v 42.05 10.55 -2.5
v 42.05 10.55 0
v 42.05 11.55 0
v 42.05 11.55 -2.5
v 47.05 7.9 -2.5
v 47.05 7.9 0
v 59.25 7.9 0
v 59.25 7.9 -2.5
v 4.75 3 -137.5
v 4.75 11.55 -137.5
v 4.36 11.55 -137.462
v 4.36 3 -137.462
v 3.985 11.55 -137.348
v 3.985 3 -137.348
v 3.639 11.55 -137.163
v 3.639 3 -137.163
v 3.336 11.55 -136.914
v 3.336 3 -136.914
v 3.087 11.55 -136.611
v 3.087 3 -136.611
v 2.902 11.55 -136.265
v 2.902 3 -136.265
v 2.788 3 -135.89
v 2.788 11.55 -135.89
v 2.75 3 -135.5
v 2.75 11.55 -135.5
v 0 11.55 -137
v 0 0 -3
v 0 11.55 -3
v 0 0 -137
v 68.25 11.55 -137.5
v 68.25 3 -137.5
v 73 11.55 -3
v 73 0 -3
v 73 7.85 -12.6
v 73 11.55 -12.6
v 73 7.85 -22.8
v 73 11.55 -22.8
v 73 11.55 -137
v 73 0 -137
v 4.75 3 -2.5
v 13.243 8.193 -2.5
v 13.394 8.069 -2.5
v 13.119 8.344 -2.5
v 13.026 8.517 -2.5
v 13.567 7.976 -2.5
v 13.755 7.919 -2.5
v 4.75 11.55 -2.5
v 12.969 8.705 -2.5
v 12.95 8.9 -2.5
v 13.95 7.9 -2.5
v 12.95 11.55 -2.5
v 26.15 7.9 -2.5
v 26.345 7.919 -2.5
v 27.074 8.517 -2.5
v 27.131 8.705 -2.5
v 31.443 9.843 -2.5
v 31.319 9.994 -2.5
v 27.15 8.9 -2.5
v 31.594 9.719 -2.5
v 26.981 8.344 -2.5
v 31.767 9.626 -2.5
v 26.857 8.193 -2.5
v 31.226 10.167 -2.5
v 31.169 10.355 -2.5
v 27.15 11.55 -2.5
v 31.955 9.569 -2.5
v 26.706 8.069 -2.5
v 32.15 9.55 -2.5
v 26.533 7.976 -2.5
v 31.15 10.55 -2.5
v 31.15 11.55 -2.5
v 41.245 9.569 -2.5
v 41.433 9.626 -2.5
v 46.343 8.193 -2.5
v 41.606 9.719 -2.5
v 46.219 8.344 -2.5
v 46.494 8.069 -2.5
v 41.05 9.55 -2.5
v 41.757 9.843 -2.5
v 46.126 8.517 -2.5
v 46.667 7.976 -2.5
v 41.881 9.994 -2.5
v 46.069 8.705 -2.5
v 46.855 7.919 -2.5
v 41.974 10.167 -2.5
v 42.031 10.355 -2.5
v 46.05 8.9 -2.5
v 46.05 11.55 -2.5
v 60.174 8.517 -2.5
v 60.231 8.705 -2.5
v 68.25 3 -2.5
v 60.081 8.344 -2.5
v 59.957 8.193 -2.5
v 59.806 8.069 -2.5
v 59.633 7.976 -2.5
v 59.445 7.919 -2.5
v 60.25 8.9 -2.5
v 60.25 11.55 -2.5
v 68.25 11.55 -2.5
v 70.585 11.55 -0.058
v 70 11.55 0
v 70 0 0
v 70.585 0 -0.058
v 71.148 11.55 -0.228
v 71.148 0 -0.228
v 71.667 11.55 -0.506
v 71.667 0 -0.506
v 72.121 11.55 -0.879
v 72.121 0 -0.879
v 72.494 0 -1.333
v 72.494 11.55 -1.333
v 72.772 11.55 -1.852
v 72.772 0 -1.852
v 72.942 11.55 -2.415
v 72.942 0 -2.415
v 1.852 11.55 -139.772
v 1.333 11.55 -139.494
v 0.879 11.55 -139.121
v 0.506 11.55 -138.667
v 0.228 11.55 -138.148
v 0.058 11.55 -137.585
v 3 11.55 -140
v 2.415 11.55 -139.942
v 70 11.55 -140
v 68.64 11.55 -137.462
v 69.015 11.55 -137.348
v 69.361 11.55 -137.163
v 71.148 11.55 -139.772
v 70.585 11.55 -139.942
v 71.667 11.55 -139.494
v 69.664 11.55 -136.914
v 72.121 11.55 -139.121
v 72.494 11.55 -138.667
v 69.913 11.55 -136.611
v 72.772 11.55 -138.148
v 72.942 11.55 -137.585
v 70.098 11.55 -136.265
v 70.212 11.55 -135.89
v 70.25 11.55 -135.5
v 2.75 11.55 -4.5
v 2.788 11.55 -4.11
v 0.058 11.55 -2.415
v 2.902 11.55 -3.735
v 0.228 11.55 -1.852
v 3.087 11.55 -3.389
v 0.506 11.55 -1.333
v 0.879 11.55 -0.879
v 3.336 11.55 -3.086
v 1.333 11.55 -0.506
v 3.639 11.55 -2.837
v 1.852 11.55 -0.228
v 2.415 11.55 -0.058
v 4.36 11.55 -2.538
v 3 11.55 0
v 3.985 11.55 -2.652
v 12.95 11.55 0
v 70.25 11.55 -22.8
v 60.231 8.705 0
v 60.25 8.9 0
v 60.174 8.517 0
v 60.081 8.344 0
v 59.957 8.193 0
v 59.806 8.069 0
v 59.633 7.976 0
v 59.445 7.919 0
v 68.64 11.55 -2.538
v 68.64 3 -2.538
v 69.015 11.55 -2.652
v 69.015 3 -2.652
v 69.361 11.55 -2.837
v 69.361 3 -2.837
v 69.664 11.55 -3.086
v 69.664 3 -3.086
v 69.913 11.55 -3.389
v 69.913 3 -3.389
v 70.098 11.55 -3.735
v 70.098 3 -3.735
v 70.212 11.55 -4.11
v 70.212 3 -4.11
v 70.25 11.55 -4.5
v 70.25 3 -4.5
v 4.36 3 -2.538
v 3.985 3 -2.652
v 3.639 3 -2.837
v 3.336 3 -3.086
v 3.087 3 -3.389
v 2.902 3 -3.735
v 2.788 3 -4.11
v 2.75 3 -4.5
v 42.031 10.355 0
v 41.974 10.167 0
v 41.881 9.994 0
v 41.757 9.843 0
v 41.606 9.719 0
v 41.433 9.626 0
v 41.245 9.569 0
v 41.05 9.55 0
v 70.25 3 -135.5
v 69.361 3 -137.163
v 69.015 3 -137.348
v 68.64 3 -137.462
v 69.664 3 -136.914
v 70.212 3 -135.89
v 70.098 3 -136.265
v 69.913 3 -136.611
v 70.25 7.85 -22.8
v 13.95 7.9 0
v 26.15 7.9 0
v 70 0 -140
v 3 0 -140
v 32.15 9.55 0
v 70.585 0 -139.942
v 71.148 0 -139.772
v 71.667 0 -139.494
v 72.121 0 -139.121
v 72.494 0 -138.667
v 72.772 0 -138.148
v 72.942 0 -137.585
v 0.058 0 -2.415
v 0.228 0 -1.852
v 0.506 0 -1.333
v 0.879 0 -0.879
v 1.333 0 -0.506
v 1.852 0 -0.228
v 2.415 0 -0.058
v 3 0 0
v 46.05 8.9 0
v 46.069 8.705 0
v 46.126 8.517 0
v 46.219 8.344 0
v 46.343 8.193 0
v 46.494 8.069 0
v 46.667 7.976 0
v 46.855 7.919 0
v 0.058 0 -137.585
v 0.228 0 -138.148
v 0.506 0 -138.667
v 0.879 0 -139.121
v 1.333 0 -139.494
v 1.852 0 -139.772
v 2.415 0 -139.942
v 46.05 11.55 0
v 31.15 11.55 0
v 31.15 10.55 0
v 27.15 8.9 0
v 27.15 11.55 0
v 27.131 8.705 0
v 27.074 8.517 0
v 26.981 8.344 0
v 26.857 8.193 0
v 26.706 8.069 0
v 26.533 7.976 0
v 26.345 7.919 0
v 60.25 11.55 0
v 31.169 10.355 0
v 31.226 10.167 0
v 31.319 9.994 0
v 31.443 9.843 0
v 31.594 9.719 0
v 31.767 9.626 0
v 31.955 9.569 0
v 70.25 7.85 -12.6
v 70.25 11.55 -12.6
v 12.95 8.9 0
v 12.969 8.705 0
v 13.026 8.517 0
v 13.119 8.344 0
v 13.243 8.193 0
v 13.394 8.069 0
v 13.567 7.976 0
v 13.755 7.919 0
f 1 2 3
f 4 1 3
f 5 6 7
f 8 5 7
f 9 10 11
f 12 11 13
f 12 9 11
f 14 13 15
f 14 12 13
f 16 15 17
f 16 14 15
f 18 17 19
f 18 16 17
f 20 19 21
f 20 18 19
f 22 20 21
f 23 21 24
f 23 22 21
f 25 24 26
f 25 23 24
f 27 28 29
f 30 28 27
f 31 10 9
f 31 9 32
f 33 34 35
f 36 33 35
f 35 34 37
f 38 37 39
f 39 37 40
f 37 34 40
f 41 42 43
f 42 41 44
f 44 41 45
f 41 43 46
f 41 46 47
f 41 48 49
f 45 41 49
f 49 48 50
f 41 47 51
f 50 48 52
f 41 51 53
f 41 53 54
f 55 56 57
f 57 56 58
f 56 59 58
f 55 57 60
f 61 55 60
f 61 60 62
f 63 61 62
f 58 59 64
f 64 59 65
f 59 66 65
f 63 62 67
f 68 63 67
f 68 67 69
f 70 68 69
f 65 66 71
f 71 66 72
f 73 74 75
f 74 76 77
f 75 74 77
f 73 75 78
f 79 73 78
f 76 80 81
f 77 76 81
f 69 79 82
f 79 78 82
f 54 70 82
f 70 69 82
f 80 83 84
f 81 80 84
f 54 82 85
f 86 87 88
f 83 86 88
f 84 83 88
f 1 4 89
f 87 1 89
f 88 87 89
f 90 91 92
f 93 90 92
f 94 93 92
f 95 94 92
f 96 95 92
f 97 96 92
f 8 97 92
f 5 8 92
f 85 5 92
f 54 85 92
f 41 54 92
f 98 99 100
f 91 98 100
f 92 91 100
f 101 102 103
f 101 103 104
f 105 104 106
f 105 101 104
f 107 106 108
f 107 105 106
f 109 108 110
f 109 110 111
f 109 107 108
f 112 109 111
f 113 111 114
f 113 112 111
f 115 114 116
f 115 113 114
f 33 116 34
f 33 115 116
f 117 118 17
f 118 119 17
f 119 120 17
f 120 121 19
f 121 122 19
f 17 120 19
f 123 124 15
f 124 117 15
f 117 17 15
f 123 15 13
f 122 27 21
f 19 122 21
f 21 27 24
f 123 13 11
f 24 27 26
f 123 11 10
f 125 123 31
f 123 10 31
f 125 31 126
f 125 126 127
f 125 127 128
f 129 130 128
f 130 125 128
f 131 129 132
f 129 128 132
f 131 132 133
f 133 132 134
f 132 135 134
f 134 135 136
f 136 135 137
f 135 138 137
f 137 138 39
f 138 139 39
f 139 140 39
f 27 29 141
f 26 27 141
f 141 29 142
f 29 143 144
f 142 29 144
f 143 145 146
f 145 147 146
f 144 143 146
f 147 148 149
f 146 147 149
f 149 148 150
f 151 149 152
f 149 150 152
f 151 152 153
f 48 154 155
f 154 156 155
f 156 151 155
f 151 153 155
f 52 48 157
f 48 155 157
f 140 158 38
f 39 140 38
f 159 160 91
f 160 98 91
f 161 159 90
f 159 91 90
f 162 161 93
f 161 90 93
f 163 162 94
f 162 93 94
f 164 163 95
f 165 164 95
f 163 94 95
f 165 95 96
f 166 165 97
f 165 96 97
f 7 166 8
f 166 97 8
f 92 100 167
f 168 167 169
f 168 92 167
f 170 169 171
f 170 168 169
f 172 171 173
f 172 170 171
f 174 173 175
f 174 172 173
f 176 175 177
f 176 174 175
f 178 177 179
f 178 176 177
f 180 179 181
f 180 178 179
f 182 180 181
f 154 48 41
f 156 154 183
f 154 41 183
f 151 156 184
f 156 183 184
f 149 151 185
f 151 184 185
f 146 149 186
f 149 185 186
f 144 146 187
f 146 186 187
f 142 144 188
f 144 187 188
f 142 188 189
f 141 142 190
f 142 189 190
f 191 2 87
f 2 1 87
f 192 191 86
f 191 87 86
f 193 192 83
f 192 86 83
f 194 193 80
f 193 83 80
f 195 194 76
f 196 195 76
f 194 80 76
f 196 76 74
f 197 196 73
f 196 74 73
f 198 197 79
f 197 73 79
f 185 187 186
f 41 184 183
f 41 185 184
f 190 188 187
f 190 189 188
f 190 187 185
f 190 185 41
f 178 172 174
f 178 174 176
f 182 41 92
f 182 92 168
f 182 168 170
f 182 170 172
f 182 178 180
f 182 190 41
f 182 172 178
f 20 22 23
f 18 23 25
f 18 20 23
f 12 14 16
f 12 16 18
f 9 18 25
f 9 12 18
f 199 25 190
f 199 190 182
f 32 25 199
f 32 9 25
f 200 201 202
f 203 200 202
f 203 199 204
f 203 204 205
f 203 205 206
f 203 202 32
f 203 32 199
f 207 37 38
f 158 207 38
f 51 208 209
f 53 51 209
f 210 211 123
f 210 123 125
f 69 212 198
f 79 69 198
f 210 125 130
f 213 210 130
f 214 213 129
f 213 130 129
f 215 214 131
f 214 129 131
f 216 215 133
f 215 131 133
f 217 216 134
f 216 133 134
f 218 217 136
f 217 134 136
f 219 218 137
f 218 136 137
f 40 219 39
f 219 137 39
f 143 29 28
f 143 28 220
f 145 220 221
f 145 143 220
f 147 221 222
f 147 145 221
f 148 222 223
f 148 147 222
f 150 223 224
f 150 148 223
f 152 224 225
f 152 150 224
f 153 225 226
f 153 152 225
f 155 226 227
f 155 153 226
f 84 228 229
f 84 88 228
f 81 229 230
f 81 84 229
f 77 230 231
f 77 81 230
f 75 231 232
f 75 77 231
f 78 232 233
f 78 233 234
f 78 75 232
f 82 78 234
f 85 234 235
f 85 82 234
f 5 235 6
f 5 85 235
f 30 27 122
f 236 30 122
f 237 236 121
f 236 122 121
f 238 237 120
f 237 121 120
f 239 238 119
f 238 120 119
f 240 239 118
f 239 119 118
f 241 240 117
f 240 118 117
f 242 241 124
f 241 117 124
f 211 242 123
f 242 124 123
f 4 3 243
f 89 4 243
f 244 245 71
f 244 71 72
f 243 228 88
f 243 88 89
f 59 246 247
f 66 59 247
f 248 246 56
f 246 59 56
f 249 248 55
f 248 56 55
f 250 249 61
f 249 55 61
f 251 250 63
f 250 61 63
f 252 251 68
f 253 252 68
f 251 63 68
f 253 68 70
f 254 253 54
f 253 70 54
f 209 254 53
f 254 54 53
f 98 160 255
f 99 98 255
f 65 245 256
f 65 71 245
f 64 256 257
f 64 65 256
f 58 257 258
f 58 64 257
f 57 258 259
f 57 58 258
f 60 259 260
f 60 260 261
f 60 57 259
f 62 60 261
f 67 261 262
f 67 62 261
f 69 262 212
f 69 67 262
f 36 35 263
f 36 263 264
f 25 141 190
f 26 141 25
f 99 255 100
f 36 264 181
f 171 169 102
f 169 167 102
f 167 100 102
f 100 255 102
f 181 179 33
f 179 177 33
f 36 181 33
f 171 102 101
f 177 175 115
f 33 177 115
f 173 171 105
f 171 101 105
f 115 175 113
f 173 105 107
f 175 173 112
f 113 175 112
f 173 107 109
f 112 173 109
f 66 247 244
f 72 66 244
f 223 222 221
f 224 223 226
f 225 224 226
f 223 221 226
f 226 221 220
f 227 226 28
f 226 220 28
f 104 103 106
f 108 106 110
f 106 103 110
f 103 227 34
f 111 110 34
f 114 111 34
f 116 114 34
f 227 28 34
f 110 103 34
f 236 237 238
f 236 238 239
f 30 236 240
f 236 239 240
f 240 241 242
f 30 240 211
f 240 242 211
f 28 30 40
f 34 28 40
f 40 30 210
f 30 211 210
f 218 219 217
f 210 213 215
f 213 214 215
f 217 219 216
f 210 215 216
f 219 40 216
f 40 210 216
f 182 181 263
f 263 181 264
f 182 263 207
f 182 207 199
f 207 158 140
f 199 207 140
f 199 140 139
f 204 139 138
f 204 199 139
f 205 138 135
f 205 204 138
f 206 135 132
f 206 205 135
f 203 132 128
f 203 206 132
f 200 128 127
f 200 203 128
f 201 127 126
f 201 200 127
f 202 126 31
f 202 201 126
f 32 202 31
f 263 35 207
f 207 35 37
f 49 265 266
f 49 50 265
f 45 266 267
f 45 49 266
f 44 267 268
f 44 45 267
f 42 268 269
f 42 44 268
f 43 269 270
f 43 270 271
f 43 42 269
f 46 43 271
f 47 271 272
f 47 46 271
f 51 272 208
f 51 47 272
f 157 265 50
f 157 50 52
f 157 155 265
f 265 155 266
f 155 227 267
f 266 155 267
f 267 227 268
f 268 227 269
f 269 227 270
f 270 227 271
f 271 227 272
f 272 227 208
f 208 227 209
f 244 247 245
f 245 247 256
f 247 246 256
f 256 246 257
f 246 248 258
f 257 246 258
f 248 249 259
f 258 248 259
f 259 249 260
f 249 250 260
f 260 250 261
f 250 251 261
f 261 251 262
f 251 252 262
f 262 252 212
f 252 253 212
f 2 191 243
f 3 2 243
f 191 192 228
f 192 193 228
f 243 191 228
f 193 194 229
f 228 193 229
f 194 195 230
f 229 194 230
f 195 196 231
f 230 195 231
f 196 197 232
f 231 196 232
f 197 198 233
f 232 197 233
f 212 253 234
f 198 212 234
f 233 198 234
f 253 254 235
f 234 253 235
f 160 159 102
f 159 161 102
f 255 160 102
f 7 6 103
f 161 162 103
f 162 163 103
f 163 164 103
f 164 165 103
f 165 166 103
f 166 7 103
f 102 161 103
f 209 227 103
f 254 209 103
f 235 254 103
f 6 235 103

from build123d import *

# Parameters (mm, degrees)
SKETCH1_W           = 73
SKETCH1_H           = 140
BOSS_EXTRUDE1_DEPTH = 16
SKETCH2_W           = 67.5
SKETCH2_H           = 135
CUT_EXTRUDE1_DEPTH  = 13
SKETCH3_W           = 14.2
SKETCH3_H           = 6.45
SKETCH3_W_2         = 10.9
SKETCH3_H_2         = 4.8
CUT_EXTRUDE2_DEPTH  = 2.5
FILLET1_R           = 3
SKETCH4_W           = 10.2
SKETCH4_H           = 5.5
CUT_EXTRUDE3_DEPTH  = 2.75
FILLET2_R           = 1
FILLET3_R           = 1
FILLET4_R           = 2
CHAMFER1_SIZE       = 1
SKETCH6_W           = 92.196914974
SKETCH6_H           = 18.56524909
CUT_EXTRUDE4_DEPTH  = 159.697826072


with BuildPart() as part:
    # Sketch1 → Boss-Extrude1 (new body)
    with BuildSketch(Plane(origin=(0, 0, 0), x_dir=(1, 0, 0), z_dir=(0, 1, 0))):
        with Locations((36.5, 70)):
            Rectangle(SKETCH1_W, SKETCH1_H)
    extrude(amount=BOSS_EXTRUDE1_DEPTH)

    # Sketch2 → Cut-Extrude1 (cut)
    with BuildSketch(Plane(origin=(0, 16, 0), x_dir=(1, 0, 0), z_dir=(0, 1, 0))):
        with Locations((36.5, 70)):
            Rectangle(SKETCH2_W, SKETCH2_H)
    extrude(amount=-CUT_EXTRUDE1_DEPTH, mode=Mode.SUBTRACT)

    # Sketch3 → Cut-Extrude2 (cut)
    with BuildSketch(Plane.XY):
        with Locations((20.05, 11.125)):
            Rectangle(SKETCH3_W, SKETCH3_H)
        with Locations((36.6, 11.95)):
            Rectangle(SKETCH3_W_2, SKETCH3_H_2)
        with Locations((53.15, 11.125)):
            Rectangle(SKETCH3_W, SKETCH3_H)
    extrude(amount=-CUT_EXTRUDE2_DEPTH, mode=Mode.SUBTRACT)

    # Fillet1
    fillet1_edges = [part.edges().sort_by_distance(p)[0] for p in [
        (0, 8, -140),
        (73, 8, -140),
        (73, 8, 0),
        (0, 8, 0),
    ]]
    fillet(fillet1_edges, radius=FILLET1_R)

    # Sketch4 → Cut-Extrude3 (cut)
    with BuildSketch(Plane(origin=(73, 0, 0), x_dir=(0, 0, -1), z_dir=(1, 0, 0))):
        with Locations((17.7, 10.6)):
            Rectangle(SKETCH4_W, SKETCH4_H)
    extrude(amount=-CUT_EXTRUDE3_DEPTH, mode=Mode.SUBTRACT)

    # Fillet2
    fillet2_edges = [part.edges().sort_by_distance(p)[0] for p in [
        (27.15, 14.35, -1.25),
        (27.15, 7.9, -1.25),
        (12.95, 7.9, -1.25),
        (12.95, 14.35, -1.25),
        (31.15, 9.55, -1.25),
        (31.15, 14.35, -1.25),
        (42.05, 14.35, -1.25),
        (42.05, 9.55, -1.25),
        (60.25, 7.9, -1.25),
        (46.05, 7.9, -1.25),
        (46.05, 14.35, -1.25),
        (60.25, 14.35, -1.25),
    ]]
    fillet(fillet2_edges, radius=FILLET2_R)

    # Fillet3
    fillet3_edges = [part.edges().sort_by_distance(p)[0] for p in [
        (0, 16, -70),
        (36.5, 16, -140),
        (36.5, 16, 0),
        (73, 16, -70),
        (0.878679656, 16, -0.878679656),
        (72.121320344, 16, -0.878679656),
        (72.121320344, 16, -139.121320344),
        (0.878679656, 16, -139.121320344),
    ]]
    fillet(fillet3_edges, radius=FILLET3_R)

    # Fillet4
    fillet4_edges = [part.edges().sort_by_distance(p)[0] for p in [
        (2.75, 9.5, -2.5),
        (2.75, 9.5, -137.5),
        (70.25, 9.5, -137.5),
        (70.25, 9.5, -2.5),
    ]]
    fillet(fillet4_edges, radius=FILLET4_R)

    # Chamfer1
    chamfer1_edges = [part.edges().sort_by_distance(p)[0] for p in [
        (70.25, 16, -70),
        (36.5, 16, -2.5),
        (36.5, 16, -137.5),
        (2.75, 16, -70),
        (69.664213562, 16, -3.085786438),
        (69.664213562, 16, -136.914213562),
        (3.335786438, 16, -136.914213562),
        (3.335786438, 16, -3.085786438),
    ]]
    chamfer(chamfer1_edges, length=CHAMFER1_SIZE)

    # Sketch6 → Cut-Extrude4 (cut, through all)
    with BuildSketch(Plane.XY):
        with Locations((35.320005354, 20.832624545)):
            Rectangle(SKETCH6_W, SKETCH6_H)
    extrude(amount=-CUT_EXTRUDE4_DEPTH, mode=Mode.SUBTRACT)


solid = part.part
